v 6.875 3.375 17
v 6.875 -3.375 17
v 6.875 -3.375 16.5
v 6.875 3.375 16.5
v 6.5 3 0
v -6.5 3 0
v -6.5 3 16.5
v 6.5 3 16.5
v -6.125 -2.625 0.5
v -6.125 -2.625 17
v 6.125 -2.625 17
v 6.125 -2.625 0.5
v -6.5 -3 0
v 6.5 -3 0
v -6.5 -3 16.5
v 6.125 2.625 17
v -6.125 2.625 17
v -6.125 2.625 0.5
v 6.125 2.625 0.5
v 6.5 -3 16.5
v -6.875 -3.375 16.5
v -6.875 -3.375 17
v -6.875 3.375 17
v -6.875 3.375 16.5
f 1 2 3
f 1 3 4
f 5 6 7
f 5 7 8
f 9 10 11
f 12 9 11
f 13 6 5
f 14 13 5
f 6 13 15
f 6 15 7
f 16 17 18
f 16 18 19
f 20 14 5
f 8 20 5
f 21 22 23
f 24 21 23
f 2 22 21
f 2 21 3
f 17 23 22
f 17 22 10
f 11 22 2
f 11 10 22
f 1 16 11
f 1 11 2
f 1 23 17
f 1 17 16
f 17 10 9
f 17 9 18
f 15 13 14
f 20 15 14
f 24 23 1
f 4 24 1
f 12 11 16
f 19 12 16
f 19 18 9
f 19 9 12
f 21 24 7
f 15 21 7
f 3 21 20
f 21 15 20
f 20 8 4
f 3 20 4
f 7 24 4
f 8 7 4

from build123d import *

# Parameters (mm, degrees)
F0_W     = 13
F0_H     = 6
F1_DEPTH = 17
F2_W     = 13.75
F2_H     = 6.75
F2_W_2   = 13
F2_H_2   = 6
F3_DEPTH = 0.5
F4_W     = 12.25
F4_H     = 5.25
F5_DEPTH = 16.5


with BuildPart() as f1:
    # F0 (on Top) → F1 (new body)
    with BuildSketch(Plane.XY):
        Rectangle(F0_W, F0_H)
    extrude(amount=F1_DEPTH)

    # F2 (on face) → F3 (join)
    with BuildSketch(Plane.XY.offset(17)):
        Rectangle(F2_W, F2_H)
        Rectangle(F2_W_2, F2_H_2, mode=Mode.SUBTRACT)
        Rectangle(F2_W_2, F2_H_2)
    extrude(amount=-F3_DEPTH)

    # F4 (on face) → F5 (cut, through all)
    with BuildSketch(Plane.XY.offset(17)):
        Rectangle(F4_W, F4_H)
    extrude(amount=-F5_DEPTH, mode=Mode.SUBTRACT)


solid = f1.part
